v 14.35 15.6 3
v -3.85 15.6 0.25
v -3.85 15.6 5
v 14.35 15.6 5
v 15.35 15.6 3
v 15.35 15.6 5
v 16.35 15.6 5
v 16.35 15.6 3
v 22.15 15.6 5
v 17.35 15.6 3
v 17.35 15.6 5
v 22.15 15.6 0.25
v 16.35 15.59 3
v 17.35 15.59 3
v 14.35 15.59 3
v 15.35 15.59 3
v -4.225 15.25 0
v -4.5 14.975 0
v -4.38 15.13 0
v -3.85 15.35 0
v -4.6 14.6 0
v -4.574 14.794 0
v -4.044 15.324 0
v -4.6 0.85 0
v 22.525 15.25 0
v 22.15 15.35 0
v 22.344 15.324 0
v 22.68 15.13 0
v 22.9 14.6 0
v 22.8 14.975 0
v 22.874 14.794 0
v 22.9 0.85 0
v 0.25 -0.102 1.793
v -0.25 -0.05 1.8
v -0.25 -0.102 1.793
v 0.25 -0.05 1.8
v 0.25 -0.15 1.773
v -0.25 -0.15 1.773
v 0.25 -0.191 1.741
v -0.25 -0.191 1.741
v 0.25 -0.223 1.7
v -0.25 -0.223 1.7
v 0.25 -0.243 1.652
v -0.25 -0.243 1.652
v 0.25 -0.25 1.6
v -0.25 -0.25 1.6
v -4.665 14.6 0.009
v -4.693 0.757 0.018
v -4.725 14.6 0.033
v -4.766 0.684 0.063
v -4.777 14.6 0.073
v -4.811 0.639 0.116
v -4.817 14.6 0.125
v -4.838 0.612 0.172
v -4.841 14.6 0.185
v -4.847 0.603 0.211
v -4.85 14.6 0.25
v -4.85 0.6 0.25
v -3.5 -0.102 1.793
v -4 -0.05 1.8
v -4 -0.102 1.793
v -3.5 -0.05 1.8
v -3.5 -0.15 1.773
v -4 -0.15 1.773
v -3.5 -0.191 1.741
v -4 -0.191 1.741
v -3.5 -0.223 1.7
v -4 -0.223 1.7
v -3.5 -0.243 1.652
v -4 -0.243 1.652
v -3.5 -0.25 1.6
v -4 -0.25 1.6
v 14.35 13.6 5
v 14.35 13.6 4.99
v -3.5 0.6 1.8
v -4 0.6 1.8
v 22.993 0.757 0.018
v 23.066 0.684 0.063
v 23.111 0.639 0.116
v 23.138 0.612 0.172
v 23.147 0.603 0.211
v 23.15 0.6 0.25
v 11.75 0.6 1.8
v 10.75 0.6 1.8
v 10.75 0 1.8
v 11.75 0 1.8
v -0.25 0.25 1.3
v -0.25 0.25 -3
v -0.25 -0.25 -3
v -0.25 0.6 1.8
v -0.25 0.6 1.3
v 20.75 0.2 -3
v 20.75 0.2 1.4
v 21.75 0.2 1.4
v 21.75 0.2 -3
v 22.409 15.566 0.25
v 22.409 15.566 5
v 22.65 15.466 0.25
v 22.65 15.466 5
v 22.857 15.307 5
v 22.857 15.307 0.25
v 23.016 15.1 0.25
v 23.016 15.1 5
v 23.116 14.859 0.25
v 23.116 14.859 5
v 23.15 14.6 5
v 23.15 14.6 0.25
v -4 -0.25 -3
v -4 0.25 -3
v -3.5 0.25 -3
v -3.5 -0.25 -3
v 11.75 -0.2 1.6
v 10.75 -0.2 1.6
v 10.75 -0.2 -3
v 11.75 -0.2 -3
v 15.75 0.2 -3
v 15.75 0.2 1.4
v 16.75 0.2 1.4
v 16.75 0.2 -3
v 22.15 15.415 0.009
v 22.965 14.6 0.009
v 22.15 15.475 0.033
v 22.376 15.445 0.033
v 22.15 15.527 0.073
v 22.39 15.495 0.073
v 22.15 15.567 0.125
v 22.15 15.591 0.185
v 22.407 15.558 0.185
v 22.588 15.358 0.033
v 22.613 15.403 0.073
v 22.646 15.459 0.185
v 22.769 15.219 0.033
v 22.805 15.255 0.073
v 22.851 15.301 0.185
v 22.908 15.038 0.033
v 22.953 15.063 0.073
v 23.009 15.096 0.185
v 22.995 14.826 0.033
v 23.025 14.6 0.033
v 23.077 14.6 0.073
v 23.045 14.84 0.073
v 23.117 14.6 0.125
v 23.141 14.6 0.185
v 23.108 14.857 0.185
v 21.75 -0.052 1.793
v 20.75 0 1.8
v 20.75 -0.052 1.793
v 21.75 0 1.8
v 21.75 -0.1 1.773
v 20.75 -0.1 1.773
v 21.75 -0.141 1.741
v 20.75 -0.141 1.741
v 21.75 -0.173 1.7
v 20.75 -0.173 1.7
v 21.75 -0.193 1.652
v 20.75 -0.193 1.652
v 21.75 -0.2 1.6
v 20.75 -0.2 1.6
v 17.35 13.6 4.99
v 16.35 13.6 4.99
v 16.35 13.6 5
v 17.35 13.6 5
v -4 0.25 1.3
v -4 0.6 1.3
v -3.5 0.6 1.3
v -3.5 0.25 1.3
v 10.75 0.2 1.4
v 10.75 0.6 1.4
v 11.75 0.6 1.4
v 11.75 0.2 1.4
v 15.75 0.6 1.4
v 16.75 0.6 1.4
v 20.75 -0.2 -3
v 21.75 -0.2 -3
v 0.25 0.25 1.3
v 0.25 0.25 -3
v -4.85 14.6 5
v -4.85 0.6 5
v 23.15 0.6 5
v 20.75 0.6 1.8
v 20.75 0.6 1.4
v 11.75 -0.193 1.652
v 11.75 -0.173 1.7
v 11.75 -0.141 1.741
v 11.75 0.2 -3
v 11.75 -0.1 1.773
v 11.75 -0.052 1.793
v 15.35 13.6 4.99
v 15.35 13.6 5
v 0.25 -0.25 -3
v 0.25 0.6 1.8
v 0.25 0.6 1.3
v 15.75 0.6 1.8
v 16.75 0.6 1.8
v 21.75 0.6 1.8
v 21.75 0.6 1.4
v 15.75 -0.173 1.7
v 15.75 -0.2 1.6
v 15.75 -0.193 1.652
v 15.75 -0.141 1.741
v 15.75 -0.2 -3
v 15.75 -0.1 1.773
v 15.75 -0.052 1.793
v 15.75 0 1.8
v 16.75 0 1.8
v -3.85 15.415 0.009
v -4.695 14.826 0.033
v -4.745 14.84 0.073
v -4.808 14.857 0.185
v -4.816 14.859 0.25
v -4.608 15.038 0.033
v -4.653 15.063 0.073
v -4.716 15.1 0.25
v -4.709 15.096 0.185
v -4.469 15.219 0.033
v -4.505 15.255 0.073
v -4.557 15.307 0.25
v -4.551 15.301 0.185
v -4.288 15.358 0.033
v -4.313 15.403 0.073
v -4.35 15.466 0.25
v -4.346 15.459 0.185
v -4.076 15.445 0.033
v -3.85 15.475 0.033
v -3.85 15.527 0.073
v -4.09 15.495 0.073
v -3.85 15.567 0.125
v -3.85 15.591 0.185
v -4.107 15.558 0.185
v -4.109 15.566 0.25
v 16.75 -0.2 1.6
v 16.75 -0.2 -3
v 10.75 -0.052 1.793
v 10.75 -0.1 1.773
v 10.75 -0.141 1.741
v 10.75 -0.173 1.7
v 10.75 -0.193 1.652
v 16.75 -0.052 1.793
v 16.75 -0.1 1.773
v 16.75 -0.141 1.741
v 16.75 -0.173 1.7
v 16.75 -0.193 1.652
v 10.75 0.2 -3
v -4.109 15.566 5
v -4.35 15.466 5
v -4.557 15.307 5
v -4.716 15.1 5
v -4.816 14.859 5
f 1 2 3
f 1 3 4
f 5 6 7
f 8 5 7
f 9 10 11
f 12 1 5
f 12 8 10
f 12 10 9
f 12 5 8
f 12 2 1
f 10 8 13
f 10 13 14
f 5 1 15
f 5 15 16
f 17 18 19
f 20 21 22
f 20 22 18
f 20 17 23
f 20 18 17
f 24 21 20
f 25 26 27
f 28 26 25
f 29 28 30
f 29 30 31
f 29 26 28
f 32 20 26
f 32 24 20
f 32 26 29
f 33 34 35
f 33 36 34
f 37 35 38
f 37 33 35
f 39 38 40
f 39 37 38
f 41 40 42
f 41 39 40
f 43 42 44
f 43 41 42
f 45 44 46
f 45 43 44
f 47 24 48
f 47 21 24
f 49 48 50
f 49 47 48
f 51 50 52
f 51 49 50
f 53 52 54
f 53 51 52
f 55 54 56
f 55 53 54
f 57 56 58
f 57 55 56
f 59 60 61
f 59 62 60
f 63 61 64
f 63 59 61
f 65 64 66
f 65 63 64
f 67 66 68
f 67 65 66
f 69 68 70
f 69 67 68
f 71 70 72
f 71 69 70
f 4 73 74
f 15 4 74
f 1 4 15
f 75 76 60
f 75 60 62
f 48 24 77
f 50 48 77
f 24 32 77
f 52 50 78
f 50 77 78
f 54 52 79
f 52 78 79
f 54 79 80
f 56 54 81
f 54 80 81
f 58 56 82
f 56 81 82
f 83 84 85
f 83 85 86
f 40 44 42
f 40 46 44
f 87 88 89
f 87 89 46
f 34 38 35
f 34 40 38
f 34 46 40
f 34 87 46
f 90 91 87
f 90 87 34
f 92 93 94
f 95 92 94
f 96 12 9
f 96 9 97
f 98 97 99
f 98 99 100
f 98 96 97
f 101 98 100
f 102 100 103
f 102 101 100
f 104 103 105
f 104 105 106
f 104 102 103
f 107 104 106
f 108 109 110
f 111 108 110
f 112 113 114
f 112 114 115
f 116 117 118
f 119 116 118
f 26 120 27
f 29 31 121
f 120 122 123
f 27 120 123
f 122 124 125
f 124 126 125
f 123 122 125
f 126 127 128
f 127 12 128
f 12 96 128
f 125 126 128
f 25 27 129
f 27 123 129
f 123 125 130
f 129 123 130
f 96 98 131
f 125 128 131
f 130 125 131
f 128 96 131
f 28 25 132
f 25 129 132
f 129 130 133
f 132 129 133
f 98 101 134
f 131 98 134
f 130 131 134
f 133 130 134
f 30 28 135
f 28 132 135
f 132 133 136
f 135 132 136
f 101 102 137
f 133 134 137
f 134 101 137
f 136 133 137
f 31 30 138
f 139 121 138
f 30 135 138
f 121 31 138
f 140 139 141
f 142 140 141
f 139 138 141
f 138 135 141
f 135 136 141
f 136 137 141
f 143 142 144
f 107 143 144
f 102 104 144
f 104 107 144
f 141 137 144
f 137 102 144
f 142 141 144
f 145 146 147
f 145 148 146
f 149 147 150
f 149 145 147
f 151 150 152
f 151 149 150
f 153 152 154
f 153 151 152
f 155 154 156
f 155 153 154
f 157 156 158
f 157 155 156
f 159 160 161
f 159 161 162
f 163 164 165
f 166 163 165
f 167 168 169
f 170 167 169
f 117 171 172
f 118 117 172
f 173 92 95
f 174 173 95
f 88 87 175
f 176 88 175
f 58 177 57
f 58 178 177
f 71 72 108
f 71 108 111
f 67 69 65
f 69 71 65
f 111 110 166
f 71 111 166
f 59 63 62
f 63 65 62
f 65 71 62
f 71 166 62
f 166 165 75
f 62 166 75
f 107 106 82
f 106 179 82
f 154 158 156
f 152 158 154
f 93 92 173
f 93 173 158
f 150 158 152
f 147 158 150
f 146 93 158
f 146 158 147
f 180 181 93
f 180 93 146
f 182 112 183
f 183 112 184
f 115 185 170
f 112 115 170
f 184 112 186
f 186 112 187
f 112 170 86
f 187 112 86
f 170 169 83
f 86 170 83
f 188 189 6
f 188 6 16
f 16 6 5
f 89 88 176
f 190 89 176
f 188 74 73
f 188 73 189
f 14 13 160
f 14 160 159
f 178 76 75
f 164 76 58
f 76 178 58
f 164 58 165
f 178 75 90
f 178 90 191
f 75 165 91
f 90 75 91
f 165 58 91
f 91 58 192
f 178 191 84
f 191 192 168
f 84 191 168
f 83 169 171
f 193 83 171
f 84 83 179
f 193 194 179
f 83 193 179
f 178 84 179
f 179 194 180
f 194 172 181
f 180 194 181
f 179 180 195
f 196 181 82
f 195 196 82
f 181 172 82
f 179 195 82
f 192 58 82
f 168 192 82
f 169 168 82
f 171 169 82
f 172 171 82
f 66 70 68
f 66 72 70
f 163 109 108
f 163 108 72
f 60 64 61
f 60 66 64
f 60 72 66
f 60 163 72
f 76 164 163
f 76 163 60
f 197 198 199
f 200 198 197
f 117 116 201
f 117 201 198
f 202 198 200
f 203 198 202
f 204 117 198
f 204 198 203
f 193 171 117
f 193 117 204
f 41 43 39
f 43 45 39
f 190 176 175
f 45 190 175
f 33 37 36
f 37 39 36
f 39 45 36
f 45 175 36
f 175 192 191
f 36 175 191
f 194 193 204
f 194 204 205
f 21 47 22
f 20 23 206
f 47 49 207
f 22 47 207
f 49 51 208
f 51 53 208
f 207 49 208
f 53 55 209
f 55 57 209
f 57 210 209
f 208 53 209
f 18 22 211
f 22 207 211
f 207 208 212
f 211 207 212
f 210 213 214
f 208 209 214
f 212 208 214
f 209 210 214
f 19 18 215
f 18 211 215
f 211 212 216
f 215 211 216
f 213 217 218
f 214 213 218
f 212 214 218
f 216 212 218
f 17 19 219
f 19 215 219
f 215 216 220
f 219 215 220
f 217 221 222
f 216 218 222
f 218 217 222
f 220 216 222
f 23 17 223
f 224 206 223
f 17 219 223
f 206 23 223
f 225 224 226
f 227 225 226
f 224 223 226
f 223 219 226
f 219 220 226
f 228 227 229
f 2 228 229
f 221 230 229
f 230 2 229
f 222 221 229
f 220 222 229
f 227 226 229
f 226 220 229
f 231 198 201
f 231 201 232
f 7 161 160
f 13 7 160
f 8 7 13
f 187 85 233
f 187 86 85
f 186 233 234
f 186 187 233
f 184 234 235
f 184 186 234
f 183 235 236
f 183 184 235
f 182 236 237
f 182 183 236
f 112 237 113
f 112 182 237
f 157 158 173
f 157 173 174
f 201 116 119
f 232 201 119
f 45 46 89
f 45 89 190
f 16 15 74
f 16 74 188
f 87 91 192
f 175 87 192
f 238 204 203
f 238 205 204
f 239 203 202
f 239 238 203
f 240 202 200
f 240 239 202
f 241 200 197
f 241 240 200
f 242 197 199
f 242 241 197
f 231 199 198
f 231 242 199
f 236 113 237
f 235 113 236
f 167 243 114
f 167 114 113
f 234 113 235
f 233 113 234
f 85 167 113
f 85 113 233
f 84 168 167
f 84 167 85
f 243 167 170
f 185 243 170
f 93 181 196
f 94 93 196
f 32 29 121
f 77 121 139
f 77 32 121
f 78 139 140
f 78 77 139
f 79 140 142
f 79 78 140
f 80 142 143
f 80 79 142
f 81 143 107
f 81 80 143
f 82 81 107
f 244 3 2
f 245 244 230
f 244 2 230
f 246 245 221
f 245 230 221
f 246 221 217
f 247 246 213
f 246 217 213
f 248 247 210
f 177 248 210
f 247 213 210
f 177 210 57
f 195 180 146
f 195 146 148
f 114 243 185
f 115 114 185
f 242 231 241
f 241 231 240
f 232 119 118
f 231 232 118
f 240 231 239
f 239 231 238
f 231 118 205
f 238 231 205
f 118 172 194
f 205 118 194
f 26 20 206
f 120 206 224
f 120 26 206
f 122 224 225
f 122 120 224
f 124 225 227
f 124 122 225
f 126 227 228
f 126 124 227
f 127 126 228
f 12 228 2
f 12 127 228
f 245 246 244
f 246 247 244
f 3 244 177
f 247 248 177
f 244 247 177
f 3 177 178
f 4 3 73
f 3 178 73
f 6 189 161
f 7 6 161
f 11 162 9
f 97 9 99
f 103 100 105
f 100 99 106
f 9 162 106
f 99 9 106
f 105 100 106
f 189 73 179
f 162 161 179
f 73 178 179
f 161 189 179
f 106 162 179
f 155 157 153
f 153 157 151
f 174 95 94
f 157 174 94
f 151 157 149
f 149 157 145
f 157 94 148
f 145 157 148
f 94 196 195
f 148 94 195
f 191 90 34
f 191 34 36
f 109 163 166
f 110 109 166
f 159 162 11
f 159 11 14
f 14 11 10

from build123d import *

# Parameters (mm, degrees)
SKETCH003_W    = 0.5
SKETCH003_H    = 0.5
SKETCH003_W_2  = 1
SKETCH003_H_2  = 0.4
PAD002_DEPTH   = 1
SKETCH001_W    = 28
SKETCH001_H    = 5
PAD001_DEPTH   = 15
SKETCH002_W    = 1
SKETCH002_H    = 2
POCKET_DEPTH   = 2
CHAMFER_SIZE   = 1.99
FILLET_R       = 1
FILLET001_R    = 0.25
SKETCH_W       = 0.5
SKETCH_H       = 0.5
SKETCH_W_2     = 1
SKETCH_H_2     = 0.4
PAD_DEPTH      = 1.3
PAD_DEPTH_BACK = 3.5
FILLET003_R    = 0.2


with BuildPart() as pad002:
    # Sketch003 → Pad002 (new body)
    with BuildSketch(Plane(origin=(-3.75, 1, 1.6), x_dir=(1, 0, 0), z_dir=(0, -1, 0))):
        with Locations((0, -0.05)):
            Rectangle(SKETCH003_W, SKETCH003_H)
        with Locations((3.75, -0.05)):
            Rectangle(SKETCH003_W, SKETCH003_H)
        with Locations((15, 0)):
            Rectangle(SKETCH003_W_2, SKETCH003_H_2)
        with Locations((20, 0)):
            Rectangle(SKETCH003_W_2, SKETCH003_H_2)
        with Locations((25, 0)):
            Rectangle(SKETCH003_W_2, SKETCH003_H_2)
    extrude(amount=PAD002_DEPTH)


with BuildPart() as fillet001:
    # Sketch001 → Pad001 (new body)
    with BuildSketch(Plane(origin=(-3.75, 0.6, 1.3), x_dir=(1, 0, 0), z_dir=(0, 1, 0))):
        with Locations((12.9, -1.2)):
            Rectangle(SKETCH001_W, SKETCH001_H)
    extrude(amount=PAD001_DEPTH)

    # Sketch002 → Pocket (cut)
    with BuildSketch(Plane(origin=(-3.75, 15.6, 1.3), x_dir=(1, 0, 0), z_dir=(0, 1, 0))):
        with Locations((18.6, -2.7)):
            Rectangle(SKETCH002_W, SKETCH002_H)
        with Locations((20.6, -2.7)):
            Rectangle(SKETCH002_W, SKETCH002_H)
    extrude(amount=-POCKET_DEPTH, mode=Mode.SUBTRACT)

    # Chamfer
    chamfer_edges = [fillet001.edges().sort_by_distance(p)[0] for p in [
        (16.85, 13.6, 3),
        (14.85, 13.6, 3),
    ]]
    chamfer(chamfer_edges, length=CHAMFER_SIZE)

    # Fillet
    fillet_edges = [fillet001.edges().sort_by_distance(p)[0] for p in [
        (-4.85, 15.6, 2.5),
        (23.15, 15.6, 2.5),
    ]]
    fillet(fillet_edges, radius=FILLET_R)

    # Fillet001
    fillet001_edges = [fillet001.edges().sort_by_distance(p)[0] for p in [
        (-4.85, 7.6, 0),
        (-4.557107, 15.307107, 0),
        (9.15, 0.6, 0),
        (9.15, 15.6, 0),
        (23.15, 7.6, 0),
        (22.857107, 15.307107, 0),
    ]]
    fillet(fillet001_edges, radius=FILLET001_R)


with BuildPart() as relay_spdt_finder_34_51_horizontal:
    # Sketch → Pad (new body, two sides)
    with BuildSketch(Plane(origin=(-3.75, 0, 0.5), x_dir=(1, 0, 0), z_dir=(0, 0, 1))) as pad_sk:
        Rectangle(SKETCH_W, SKETCH_H)
        with Locations((3.75, 0)):
            Rectangle(SKETCH_W, SKETCH_H)
        with Locations((15, 0)):
            Rectangle(SKETCH_W_2, SKETCH_H_2)
        with Locations((20, 0)):
            Rectangle(SKETCH_W_2, SKETCH_H_2)
        with Locations((25, 0)):
            Rectangle(SKETCH_W_2, SKETCH_H_2)
    extrude(amount=PAD_DEPTH)
    extrude(pad_sk.sketch, amount=-PAD_DEPTH_BACK)

    # Fillet003
    fillet003_edges = [relay_spdt_finder_34_51_horizontal.edges().sort_by_distance(p)[0] for p in [
        (-3.75, -0.25, 1.8),
        (0, -0.25, 1.8),
        (11.25, -0.2, 1.8),
        (16.25, -0.2, 1.8),
        (21.25, -0.2, 1.8),
    ]]
    fillet(fillet003_edges, radius=FILLET003_R)

    # Fillet003_mp_cp: union Pad002, Fillet001
    add(pad002.part)
    add(fillet001.part)


solid = relay_spdt_finder_34_51_horizontal.part
